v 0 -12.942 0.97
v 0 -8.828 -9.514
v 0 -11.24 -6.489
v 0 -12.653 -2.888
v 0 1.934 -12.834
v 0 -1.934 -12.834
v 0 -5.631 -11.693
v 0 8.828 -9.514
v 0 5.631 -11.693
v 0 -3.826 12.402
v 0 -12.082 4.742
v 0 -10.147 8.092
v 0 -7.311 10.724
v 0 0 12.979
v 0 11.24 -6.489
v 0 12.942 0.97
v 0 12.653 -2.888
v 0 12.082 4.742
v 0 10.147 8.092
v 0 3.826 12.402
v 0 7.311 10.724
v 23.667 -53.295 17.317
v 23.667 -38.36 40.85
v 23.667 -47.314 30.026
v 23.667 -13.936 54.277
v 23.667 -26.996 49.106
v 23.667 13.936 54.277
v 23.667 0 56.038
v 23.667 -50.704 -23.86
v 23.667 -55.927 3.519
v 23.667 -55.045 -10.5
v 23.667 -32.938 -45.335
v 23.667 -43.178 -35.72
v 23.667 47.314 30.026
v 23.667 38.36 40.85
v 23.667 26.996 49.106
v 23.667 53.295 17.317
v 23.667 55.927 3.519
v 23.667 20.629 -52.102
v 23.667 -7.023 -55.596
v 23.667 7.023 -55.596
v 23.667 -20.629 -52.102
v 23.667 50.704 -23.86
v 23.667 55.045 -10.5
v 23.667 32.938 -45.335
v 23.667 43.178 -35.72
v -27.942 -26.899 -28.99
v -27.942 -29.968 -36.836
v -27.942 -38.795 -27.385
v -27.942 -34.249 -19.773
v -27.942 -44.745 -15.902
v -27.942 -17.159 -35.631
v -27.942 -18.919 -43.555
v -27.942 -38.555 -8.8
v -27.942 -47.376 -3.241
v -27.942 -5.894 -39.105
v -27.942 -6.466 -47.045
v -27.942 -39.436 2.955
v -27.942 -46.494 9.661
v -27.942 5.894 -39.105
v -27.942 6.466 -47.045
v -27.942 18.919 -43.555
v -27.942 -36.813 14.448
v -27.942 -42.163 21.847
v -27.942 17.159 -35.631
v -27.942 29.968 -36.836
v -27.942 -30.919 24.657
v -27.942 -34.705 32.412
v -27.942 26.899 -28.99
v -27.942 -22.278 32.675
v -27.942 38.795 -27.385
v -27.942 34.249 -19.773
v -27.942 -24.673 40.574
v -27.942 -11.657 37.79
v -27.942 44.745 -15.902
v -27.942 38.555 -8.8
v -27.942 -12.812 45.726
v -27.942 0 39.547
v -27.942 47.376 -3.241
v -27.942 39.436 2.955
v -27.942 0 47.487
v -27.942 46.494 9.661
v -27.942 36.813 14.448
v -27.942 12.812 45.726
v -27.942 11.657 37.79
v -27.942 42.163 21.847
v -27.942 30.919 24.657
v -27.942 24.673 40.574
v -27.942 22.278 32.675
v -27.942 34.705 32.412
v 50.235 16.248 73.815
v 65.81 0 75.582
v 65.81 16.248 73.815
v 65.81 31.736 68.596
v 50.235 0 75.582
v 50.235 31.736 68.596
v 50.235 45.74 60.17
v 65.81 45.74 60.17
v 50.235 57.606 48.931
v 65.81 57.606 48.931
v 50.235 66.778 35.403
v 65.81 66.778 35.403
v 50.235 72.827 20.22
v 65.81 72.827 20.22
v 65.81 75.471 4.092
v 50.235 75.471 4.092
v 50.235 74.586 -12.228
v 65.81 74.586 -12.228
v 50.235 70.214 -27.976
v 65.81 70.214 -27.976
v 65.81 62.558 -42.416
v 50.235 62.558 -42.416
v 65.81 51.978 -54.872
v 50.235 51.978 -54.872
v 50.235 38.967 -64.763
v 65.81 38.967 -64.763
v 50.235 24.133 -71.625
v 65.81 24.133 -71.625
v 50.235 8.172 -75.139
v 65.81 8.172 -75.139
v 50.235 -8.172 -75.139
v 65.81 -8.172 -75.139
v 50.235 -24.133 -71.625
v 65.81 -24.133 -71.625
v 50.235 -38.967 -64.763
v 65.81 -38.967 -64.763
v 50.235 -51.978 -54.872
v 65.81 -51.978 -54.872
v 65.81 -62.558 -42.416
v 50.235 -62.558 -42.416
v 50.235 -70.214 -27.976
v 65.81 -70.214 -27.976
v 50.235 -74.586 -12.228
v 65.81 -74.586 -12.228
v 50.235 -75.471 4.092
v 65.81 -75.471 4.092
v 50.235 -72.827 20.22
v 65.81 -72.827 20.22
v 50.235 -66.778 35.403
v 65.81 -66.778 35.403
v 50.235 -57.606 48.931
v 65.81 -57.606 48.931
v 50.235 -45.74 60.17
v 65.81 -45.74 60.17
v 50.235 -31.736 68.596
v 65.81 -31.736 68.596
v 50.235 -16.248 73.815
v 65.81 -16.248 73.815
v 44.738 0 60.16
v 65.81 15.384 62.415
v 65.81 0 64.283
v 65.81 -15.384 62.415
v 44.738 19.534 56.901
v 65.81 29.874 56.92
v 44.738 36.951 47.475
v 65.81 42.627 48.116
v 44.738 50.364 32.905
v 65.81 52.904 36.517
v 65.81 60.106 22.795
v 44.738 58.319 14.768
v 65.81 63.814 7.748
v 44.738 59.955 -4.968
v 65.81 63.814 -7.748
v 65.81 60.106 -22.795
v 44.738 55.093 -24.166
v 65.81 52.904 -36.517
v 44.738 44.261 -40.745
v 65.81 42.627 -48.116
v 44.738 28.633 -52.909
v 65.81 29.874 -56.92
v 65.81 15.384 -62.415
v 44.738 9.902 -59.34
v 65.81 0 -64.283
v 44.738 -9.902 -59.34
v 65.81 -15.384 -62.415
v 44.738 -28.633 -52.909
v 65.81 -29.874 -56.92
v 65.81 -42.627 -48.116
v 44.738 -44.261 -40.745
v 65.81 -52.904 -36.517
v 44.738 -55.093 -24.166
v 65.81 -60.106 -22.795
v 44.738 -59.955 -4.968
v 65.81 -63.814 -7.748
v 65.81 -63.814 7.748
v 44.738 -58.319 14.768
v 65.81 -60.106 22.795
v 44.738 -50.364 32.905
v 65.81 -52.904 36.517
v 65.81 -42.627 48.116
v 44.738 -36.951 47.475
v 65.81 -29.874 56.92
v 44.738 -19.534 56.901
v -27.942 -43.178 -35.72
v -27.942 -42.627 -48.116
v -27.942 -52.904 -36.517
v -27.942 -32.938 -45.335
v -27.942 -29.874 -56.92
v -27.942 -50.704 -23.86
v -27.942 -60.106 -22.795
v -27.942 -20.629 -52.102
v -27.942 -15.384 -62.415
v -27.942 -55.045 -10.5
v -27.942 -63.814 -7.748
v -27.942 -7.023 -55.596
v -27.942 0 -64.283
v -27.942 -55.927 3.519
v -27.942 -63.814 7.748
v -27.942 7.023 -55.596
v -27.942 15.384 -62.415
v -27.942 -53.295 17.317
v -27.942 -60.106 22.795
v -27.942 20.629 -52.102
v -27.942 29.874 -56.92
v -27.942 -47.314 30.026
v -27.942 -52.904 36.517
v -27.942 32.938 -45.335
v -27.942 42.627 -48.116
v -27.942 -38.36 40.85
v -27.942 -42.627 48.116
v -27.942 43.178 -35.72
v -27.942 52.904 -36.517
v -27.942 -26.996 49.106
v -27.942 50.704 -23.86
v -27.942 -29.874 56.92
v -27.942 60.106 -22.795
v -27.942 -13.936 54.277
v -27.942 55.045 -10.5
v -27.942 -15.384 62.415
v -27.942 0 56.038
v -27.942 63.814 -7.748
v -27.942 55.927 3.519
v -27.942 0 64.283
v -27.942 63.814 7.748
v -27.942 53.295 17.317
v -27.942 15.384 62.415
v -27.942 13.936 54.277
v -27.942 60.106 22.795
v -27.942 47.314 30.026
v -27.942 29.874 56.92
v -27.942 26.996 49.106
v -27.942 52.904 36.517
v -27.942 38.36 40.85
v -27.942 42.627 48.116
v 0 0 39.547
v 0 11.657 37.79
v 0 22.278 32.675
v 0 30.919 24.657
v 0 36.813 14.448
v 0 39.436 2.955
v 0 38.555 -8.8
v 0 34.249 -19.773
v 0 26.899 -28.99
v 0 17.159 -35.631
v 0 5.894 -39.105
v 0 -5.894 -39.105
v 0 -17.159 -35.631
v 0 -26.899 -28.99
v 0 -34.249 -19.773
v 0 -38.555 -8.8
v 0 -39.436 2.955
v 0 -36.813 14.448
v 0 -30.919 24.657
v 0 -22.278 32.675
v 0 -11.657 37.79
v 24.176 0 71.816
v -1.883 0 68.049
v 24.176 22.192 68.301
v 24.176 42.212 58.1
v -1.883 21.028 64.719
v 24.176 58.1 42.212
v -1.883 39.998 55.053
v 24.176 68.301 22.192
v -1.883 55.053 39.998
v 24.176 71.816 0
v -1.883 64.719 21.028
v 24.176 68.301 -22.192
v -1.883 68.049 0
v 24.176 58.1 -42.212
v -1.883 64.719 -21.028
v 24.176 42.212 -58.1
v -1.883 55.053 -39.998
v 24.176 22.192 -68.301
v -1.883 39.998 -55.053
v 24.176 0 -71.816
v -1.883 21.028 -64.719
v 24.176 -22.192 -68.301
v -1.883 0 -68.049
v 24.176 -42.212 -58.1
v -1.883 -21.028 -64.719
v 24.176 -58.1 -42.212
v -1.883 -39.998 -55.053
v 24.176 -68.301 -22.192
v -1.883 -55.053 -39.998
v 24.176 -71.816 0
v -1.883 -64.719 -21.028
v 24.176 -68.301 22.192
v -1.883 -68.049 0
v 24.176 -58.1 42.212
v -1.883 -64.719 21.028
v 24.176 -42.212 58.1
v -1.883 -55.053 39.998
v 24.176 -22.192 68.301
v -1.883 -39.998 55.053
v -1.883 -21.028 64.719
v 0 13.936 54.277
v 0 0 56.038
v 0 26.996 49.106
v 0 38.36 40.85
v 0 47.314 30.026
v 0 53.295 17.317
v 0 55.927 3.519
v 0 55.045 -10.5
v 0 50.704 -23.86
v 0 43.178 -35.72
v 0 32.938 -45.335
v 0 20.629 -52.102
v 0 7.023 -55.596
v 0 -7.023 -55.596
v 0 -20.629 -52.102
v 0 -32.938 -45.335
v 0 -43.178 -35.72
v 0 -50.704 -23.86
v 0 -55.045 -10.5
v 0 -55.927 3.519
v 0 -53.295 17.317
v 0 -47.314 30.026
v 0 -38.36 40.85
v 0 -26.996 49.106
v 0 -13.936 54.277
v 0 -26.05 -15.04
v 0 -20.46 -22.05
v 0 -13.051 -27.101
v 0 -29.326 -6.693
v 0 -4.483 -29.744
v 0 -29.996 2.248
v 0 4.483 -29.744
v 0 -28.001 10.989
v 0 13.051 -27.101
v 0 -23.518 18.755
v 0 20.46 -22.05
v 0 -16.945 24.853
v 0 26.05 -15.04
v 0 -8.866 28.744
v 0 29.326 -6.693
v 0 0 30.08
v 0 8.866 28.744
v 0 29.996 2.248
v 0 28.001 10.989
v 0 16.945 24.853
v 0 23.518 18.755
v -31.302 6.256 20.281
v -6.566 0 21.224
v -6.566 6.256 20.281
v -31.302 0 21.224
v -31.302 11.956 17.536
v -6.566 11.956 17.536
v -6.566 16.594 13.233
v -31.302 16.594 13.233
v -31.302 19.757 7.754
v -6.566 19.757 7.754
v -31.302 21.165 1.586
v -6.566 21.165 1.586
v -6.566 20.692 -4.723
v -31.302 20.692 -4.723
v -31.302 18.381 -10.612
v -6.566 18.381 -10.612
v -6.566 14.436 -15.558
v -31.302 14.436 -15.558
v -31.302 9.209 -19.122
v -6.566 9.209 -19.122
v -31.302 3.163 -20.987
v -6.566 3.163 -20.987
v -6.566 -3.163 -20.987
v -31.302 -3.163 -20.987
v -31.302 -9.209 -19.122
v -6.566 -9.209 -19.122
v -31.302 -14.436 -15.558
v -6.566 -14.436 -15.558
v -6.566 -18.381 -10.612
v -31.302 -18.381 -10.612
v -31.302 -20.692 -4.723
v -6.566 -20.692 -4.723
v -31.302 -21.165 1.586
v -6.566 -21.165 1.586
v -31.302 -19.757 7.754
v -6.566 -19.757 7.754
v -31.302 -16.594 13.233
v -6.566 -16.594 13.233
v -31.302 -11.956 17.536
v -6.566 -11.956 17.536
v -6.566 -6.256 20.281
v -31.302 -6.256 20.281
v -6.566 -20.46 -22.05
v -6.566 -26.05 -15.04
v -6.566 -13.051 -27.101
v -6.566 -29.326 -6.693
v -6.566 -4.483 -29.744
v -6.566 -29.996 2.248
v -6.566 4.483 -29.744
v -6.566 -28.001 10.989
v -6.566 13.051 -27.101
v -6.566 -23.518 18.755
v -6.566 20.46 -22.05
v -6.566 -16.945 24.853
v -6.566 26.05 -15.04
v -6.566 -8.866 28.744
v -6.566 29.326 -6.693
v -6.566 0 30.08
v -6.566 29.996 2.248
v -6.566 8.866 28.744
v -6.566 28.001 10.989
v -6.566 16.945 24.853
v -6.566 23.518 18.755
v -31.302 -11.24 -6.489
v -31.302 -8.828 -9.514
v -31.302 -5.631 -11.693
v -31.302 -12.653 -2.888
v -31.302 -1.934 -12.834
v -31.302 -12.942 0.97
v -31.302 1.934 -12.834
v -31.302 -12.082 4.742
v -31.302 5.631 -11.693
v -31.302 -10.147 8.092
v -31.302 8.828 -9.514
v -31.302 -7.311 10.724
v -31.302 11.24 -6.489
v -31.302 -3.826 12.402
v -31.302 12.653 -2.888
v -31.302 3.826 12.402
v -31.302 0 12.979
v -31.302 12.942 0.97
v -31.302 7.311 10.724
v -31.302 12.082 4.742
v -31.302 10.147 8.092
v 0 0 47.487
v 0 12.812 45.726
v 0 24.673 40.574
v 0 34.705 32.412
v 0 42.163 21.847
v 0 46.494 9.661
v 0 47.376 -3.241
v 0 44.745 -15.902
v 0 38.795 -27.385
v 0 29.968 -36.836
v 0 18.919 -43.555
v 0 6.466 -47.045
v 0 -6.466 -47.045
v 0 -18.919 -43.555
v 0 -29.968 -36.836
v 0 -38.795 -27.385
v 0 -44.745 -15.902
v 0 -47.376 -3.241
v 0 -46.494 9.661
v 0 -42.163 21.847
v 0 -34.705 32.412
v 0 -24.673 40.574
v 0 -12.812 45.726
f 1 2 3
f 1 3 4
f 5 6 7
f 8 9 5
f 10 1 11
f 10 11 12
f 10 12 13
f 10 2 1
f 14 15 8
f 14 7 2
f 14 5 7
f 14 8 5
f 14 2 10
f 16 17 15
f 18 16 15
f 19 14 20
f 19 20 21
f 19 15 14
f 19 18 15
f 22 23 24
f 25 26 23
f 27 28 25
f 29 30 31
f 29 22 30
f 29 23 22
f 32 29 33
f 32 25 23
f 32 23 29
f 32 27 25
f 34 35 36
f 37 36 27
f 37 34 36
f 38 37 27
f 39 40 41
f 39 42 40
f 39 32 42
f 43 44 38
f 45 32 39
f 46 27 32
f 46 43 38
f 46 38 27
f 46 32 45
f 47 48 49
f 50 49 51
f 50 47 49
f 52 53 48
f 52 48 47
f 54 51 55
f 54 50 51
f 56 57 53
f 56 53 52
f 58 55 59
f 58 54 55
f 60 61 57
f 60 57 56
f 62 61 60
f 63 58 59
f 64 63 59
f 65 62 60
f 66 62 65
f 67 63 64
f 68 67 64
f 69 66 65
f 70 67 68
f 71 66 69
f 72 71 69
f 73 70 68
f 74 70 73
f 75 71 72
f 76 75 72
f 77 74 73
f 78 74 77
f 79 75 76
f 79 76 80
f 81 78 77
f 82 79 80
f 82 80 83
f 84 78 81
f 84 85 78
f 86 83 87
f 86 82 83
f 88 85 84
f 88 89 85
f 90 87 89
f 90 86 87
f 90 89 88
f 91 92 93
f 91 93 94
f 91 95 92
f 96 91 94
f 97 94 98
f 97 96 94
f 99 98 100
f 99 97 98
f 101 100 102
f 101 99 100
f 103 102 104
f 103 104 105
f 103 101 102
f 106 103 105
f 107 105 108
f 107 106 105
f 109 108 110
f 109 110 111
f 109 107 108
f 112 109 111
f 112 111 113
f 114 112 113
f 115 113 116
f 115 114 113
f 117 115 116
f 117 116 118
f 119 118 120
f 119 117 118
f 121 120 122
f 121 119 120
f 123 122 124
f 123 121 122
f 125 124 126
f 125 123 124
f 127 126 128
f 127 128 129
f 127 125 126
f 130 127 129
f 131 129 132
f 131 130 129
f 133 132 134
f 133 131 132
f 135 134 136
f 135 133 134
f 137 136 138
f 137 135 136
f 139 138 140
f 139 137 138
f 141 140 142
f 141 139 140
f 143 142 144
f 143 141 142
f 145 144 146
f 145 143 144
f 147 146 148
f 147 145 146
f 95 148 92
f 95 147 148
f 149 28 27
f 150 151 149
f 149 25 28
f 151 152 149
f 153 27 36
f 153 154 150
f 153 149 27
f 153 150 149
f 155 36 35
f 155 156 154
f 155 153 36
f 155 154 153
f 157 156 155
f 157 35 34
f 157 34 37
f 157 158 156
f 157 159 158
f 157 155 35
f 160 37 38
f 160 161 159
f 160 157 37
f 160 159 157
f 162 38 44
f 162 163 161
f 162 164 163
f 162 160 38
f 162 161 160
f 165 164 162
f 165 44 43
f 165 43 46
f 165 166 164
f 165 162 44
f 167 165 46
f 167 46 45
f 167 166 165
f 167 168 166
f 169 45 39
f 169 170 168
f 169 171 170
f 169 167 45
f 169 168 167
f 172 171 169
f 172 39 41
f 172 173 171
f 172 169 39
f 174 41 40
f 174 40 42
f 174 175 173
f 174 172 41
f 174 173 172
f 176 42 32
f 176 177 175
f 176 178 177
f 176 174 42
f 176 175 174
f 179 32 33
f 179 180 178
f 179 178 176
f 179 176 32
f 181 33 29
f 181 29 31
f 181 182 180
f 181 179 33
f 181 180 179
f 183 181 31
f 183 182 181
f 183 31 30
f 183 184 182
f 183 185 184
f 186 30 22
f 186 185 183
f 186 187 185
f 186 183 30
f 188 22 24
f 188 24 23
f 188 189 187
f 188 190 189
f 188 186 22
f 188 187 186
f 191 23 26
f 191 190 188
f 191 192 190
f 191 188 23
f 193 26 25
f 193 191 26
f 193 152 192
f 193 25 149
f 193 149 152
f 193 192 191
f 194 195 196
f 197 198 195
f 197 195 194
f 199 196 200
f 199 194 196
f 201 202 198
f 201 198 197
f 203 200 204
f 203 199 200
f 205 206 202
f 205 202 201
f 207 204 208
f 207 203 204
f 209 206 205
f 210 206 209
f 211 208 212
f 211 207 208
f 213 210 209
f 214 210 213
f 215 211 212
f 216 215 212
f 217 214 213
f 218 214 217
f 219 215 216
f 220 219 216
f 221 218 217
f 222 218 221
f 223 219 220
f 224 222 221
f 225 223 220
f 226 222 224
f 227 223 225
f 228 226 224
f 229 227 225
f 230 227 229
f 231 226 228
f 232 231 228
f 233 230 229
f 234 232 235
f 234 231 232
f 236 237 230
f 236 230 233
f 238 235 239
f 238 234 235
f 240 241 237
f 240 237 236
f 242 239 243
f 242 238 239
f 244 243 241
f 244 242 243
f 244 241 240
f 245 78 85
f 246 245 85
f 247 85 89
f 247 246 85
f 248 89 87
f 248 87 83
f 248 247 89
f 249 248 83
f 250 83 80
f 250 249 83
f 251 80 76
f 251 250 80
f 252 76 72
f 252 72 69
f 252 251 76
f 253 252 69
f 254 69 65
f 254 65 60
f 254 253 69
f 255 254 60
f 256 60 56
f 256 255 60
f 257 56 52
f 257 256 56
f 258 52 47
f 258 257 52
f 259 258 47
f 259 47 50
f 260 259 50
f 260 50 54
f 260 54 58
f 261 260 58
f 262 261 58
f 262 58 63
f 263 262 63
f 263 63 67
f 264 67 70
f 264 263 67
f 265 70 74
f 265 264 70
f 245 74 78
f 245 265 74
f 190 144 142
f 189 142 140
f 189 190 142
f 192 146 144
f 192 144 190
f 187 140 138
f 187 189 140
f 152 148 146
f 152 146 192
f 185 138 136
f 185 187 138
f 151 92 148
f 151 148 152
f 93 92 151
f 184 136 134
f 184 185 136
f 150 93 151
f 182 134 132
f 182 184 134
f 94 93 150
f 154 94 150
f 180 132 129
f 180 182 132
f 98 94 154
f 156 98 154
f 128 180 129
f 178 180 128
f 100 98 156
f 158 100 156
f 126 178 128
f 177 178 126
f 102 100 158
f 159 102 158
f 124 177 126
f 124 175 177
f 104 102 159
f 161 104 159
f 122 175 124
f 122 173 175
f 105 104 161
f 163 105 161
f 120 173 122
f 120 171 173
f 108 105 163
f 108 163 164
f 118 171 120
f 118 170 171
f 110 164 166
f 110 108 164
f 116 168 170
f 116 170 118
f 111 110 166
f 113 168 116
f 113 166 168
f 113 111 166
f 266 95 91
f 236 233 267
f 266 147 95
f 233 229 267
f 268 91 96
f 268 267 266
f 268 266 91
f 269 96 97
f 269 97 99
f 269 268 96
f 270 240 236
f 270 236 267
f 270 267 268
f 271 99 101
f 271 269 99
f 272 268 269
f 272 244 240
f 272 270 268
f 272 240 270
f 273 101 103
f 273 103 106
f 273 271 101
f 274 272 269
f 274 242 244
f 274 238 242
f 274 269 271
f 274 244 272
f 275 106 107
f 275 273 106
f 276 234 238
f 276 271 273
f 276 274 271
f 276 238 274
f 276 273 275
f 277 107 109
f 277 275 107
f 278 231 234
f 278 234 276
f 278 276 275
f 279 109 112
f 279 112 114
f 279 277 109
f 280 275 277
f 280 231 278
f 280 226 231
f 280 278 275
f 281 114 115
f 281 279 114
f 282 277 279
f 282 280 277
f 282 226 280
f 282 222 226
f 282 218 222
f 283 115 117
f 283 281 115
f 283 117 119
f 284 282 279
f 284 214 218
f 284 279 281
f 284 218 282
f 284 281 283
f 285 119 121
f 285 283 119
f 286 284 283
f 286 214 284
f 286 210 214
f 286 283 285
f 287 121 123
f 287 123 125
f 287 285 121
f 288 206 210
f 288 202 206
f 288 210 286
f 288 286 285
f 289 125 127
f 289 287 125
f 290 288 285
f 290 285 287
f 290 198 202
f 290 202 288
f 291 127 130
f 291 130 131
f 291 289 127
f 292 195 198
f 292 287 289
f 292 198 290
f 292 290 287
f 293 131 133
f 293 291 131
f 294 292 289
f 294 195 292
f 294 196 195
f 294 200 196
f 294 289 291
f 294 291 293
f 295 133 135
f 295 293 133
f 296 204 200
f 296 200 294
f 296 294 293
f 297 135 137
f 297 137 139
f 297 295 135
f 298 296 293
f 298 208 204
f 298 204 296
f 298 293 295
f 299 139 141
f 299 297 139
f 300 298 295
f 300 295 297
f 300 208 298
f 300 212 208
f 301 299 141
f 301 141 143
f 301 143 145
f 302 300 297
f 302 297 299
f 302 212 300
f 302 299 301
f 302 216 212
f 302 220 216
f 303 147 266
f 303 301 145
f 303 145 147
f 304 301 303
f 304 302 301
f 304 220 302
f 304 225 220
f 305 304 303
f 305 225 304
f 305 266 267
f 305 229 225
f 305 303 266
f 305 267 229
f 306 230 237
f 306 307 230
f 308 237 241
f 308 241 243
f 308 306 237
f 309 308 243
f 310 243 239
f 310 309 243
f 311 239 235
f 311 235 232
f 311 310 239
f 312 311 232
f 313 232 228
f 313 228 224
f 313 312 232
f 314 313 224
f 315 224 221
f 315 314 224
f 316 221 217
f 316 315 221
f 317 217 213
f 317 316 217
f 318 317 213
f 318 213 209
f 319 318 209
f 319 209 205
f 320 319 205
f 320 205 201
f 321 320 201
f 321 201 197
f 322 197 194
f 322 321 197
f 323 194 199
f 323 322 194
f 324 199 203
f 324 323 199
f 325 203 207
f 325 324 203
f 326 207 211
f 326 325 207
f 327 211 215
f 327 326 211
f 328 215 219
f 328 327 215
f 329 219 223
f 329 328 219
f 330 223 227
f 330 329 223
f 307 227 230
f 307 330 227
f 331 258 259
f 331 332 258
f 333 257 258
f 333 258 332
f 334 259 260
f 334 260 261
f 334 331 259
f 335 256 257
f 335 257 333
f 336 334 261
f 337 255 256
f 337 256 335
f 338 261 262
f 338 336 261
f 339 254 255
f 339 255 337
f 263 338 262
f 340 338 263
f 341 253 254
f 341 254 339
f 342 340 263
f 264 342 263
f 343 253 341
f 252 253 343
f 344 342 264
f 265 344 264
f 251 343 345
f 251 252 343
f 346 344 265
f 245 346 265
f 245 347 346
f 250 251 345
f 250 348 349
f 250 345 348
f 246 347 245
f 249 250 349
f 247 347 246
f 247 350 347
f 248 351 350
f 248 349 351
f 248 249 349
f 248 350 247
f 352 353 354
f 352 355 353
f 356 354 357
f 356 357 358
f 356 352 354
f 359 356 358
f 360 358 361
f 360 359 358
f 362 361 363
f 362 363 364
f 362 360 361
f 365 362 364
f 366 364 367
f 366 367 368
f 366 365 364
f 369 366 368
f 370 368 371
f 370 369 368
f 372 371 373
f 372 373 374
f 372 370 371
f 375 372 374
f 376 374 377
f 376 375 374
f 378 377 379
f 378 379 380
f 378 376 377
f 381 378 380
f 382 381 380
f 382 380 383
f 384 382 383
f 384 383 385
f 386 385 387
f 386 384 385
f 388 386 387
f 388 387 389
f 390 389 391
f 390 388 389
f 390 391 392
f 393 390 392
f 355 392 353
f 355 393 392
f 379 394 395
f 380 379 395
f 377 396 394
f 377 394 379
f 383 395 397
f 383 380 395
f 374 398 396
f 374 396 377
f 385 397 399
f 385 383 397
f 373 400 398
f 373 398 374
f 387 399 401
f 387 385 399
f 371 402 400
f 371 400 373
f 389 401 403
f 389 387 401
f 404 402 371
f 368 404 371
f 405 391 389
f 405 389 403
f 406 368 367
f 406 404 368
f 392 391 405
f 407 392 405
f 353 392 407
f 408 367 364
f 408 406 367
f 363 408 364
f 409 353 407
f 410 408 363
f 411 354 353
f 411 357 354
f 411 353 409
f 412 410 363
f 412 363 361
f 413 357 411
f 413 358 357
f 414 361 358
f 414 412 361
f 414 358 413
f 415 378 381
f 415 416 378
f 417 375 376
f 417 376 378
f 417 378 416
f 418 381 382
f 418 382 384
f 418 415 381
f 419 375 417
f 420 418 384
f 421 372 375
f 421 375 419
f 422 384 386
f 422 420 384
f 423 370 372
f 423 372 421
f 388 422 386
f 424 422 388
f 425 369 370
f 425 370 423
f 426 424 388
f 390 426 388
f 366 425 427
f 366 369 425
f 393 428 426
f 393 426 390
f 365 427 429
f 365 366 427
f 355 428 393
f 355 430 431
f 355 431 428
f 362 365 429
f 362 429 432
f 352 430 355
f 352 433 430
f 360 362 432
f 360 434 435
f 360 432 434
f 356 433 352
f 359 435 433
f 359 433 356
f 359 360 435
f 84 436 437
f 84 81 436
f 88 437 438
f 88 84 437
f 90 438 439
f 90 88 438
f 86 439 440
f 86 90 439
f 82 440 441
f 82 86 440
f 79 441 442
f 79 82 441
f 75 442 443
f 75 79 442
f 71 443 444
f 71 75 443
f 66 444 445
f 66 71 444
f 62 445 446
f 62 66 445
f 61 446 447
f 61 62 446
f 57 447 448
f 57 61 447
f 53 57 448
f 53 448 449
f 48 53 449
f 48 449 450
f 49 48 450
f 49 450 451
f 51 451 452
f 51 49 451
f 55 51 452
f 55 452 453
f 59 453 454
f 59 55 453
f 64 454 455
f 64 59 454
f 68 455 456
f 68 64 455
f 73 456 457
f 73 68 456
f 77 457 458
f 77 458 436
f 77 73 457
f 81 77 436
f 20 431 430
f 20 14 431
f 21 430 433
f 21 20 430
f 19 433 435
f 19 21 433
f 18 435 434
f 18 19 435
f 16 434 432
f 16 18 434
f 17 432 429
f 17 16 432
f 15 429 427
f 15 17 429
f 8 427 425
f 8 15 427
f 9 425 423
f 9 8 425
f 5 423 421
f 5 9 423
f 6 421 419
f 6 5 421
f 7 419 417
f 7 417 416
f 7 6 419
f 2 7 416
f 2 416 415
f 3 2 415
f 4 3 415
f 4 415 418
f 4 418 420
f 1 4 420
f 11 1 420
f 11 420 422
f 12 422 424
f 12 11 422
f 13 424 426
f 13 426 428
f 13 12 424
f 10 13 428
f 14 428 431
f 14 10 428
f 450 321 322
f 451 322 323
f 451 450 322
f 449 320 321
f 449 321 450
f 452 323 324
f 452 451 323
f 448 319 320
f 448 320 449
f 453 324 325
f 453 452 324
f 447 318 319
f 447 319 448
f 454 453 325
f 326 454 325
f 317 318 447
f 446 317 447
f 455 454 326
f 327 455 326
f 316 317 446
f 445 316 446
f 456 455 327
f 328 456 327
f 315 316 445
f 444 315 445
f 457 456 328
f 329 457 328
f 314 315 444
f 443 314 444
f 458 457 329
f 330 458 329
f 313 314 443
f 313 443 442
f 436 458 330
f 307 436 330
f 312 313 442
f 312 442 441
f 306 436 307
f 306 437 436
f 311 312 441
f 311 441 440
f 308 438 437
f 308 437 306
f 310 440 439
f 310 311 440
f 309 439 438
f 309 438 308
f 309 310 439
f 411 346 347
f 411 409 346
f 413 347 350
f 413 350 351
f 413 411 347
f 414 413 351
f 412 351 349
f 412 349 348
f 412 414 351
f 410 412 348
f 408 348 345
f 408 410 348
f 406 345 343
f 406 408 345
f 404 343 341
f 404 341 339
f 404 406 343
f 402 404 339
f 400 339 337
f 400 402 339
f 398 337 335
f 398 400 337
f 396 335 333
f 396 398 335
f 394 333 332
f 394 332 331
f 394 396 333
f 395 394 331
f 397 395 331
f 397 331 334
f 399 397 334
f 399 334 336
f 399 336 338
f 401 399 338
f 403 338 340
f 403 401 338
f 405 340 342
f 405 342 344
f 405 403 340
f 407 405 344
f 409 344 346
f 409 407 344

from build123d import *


with BuildPart() as f1:
    # F0 (on Front) → F1 (revolve)
    with BuildSketch(Plane.XZ):
        Polygon((0, 12.978721), (0, 0), (23.66708, 0), (23.66708, 56.037541), (65.809757, 64.282842), (65.809757, 75.581968), (50.235286, 75.581968), (-27.942425, 64.282842), (-27.942425, 56.037541), (0, 56.037541), (0, 47.486853), (-27.942425, 47.486853), (-27.942425, 39.546926), (0, 39.546926), (0, 30.080097), (-6.565706, 30.080097), (-6.565706, 21.224026), (-31.301621, 21.224026), (-31.301621, 12.978721), align=None)
    revolve(axis=Axis((11.83354, 0, 0), (-1, 0, 0)))


solid = f1.part
